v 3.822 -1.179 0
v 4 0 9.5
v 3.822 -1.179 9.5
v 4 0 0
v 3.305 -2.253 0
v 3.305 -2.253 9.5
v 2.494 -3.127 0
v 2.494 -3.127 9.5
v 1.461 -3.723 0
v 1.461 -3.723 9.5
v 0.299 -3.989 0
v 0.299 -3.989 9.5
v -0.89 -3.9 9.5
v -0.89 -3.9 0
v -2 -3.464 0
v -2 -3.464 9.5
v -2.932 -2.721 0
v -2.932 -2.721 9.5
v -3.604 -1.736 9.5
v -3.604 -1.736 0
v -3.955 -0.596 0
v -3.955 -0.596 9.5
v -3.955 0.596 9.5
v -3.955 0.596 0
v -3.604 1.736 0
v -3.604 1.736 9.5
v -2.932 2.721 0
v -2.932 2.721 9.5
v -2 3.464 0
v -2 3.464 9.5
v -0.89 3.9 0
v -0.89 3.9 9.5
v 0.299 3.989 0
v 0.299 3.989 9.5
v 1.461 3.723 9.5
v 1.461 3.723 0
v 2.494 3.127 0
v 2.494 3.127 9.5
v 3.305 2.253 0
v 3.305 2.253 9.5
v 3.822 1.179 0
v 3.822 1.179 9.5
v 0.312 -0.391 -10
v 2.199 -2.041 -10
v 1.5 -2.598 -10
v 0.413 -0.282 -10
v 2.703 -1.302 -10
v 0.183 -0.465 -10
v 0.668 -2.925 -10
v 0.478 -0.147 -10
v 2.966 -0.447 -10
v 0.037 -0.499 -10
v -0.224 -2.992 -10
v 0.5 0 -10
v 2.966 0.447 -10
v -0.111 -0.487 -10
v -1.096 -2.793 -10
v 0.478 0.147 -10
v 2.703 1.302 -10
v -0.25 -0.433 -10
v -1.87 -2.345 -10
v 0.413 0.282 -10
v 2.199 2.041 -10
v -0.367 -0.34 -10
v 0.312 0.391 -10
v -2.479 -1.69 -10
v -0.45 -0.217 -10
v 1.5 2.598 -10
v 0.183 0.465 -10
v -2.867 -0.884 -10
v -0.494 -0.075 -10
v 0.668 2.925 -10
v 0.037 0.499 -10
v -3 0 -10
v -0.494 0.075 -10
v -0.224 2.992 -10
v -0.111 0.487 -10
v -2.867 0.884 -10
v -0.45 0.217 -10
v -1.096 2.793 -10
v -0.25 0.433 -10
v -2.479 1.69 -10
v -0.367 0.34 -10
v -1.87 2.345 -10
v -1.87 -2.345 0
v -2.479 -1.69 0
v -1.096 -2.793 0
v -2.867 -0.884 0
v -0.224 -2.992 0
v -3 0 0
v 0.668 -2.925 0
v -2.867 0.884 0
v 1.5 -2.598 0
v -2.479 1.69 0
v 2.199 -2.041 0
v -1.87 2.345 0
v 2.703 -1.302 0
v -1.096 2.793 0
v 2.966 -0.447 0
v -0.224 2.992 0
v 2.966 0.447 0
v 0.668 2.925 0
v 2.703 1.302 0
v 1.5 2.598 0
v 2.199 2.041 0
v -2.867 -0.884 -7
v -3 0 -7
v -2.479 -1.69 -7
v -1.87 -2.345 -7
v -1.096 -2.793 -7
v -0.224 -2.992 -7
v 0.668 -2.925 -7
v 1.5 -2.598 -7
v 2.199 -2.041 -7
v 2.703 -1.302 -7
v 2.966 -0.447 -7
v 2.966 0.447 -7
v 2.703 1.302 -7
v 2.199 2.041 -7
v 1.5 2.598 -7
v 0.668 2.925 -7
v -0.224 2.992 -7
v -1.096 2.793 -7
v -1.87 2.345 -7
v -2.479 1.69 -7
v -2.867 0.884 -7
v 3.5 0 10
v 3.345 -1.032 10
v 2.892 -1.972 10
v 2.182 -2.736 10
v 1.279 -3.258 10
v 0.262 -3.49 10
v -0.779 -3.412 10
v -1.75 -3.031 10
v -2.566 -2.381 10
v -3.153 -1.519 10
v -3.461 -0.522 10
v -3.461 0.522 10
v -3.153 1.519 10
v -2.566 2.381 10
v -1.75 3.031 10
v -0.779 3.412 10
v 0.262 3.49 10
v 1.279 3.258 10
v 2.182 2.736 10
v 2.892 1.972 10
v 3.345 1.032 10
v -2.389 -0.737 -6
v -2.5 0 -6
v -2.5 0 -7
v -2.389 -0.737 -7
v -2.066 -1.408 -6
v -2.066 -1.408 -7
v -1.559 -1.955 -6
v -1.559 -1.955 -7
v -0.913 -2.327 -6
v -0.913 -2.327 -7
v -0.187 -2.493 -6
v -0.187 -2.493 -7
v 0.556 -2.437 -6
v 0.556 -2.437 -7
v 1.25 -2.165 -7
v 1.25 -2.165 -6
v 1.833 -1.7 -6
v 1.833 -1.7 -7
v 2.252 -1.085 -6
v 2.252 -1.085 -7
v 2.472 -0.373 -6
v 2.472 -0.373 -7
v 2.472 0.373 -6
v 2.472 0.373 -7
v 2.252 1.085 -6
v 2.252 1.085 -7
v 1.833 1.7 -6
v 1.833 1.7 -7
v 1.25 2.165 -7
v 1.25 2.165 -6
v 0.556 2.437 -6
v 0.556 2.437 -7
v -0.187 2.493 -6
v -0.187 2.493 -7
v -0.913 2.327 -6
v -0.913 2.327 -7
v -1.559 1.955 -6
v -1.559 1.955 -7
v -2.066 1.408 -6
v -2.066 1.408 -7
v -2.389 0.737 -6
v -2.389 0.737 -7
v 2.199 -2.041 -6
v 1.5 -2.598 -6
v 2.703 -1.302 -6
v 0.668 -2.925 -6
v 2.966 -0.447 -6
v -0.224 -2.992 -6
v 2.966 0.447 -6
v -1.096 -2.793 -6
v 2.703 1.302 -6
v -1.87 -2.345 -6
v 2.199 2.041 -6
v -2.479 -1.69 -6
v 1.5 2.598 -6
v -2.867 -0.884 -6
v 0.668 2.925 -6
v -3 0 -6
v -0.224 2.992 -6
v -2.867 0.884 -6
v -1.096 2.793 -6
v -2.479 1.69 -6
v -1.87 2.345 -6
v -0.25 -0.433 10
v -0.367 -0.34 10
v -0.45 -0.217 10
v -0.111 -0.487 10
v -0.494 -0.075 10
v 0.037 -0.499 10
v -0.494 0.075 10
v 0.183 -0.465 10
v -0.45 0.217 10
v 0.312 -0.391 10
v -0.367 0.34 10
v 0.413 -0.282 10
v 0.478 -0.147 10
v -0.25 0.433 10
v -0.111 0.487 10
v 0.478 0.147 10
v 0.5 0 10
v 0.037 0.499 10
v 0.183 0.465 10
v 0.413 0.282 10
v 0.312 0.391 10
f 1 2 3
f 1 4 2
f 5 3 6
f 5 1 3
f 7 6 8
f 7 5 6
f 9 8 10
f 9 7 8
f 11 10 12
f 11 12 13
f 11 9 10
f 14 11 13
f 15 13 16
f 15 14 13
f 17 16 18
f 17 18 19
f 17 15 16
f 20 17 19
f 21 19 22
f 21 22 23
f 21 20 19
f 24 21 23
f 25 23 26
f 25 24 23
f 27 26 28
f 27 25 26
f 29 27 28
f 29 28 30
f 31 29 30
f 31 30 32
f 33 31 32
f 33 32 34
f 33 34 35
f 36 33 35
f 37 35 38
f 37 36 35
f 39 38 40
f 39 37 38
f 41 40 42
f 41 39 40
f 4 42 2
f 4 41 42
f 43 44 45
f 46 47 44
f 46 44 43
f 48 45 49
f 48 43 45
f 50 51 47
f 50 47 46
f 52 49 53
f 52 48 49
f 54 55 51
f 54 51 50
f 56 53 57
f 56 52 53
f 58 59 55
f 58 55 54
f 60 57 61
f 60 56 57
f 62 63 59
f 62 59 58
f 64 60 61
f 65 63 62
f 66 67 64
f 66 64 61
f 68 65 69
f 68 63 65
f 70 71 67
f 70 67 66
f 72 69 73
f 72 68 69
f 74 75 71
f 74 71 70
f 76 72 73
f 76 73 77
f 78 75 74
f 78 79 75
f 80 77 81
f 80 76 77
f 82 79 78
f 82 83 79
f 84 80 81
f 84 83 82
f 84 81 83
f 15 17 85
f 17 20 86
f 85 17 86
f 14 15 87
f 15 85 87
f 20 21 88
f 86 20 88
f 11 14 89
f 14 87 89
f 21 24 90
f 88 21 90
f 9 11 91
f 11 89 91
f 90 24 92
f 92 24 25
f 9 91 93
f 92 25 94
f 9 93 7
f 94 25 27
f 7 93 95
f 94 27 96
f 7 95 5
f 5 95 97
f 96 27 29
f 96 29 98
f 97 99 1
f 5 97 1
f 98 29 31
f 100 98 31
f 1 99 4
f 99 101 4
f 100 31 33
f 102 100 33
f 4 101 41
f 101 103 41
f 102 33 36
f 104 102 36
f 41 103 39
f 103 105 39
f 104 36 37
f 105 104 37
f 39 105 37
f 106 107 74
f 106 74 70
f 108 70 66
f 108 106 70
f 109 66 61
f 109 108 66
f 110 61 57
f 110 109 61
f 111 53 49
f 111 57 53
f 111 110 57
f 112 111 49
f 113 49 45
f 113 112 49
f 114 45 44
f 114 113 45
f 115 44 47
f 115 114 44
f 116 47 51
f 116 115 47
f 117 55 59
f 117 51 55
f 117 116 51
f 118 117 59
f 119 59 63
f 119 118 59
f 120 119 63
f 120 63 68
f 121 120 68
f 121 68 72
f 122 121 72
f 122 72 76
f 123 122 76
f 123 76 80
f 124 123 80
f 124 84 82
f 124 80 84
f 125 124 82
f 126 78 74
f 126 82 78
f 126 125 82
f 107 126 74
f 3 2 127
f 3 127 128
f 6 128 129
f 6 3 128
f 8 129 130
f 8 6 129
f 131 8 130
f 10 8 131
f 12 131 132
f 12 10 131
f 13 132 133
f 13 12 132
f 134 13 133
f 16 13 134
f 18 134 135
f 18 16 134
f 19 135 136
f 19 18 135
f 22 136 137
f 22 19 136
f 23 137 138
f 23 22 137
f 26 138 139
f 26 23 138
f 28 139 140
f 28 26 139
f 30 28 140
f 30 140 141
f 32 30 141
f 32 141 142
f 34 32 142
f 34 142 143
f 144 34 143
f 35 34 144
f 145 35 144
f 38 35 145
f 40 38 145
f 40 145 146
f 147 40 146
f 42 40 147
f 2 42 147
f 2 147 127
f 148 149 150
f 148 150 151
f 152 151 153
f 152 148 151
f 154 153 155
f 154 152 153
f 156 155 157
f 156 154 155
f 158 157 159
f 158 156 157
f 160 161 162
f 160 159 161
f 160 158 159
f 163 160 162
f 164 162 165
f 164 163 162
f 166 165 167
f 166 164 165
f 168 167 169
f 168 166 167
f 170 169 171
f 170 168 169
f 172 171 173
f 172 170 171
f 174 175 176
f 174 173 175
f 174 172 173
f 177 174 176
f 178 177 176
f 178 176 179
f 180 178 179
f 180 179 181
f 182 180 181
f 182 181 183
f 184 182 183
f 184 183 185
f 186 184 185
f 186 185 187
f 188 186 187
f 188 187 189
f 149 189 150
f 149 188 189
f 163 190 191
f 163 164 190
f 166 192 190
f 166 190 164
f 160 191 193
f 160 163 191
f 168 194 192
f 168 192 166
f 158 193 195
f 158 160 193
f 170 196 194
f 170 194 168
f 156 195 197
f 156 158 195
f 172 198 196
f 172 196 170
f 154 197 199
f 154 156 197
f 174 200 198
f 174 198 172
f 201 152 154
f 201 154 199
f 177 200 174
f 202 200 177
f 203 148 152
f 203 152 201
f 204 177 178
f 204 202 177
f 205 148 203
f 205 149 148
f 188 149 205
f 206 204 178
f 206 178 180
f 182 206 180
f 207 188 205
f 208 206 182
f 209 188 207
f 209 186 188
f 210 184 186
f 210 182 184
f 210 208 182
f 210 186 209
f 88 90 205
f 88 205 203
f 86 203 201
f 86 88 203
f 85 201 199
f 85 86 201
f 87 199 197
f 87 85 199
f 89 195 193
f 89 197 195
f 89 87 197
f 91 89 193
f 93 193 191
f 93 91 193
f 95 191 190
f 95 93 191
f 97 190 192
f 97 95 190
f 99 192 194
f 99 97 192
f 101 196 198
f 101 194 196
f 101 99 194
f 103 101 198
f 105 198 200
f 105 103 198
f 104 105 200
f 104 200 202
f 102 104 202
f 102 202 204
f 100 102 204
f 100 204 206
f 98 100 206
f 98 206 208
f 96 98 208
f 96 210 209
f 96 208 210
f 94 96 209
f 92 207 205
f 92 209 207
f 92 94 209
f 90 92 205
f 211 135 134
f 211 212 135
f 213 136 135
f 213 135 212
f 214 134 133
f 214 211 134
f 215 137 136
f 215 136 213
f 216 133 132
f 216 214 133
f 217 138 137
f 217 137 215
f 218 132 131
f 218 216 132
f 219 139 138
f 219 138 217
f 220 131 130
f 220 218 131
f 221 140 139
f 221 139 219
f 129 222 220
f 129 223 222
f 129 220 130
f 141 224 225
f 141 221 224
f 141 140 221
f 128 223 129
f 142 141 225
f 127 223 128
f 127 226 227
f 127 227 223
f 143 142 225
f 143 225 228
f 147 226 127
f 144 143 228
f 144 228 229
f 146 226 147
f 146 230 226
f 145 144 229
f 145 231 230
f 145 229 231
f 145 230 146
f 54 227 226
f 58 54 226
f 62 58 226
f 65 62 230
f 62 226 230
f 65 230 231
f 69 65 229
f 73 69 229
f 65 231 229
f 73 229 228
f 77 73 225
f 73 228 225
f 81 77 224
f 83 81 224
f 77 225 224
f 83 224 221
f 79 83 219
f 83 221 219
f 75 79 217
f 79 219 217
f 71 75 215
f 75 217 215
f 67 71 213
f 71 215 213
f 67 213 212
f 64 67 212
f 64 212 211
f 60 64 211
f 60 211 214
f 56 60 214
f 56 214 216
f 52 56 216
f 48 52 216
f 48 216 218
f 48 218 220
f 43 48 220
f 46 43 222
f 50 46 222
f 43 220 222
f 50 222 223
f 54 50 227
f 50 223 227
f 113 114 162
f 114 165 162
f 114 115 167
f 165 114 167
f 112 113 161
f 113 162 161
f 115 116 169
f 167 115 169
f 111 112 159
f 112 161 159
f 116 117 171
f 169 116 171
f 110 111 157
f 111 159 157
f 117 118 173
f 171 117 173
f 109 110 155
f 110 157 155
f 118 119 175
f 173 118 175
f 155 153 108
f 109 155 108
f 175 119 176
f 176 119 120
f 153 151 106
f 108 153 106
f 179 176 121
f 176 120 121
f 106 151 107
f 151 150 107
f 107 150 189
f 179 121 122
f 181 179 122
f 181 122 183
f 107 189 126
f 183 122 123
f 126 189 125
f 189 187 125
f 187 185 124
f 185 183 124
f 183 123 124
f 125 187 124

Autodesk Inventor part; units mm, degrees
ref_plane "YZ Plane" through (0, 0, 0) normal (1, 0, 0) x (0, 1, 0)
ref_plane "XZ Plane" through (0, 0, 0) normal (0, 1, 0) x (-1, 0, 0)
ref_plane "XY Plane" through (0, 0, 0) normal (0, 0, 1) x (1, 0, 0)
sketch "Skizze1" plane through (0, 0, 0) normal (0, 0, 1) x (1, 0, 0)
  line L0 (-5.6, 0) -> (5.6, 0) projected
  line L1 (0, -5.6) -> (0, 5.6) projected
  circle A0 centre (0, 0) radius 4
  dimension "d0" = 8
extrude "Extrusion1" add sketch "Skizze1" along normal blind 10
sketch "Skizze2" plane through (0, 0, 0) normal (0, 0, -1) x (-1, 0, 0)
  circle A0 centre (0, 0) radius 3
  dimension "d3" = 6
extrude "Extrusion2" add sketch "Skizze2" along normal blind 6
sketch "Skizze3" plane through (0, 0, -6) normal (0, 0, -1) x (-1, 0, 0)
  circle A0 centre (0, 0) radius 2.5
  dimension "d6" = 5
extrude "Extrusion3" add sketch "Skizze3" along normal blind 1
sketch "Skizze4" plane through (0, 0, -7) normal (0, 0, -1) x (-1, 0, 0)
  circle A0 centre (0, 0) radius 3
extrude "Extrusion4" add sketch "Skizze4" along normal blind 3
sketch "Skizze5" plane through (0, 0, 10) normal (0, 0, 1) x (1, 0, 0)
  circle A0 centre (0, 0) radius 0.5
  dimension "d11" = 1
extrude "Extrusion5" cut sketch "Skizze5" against normal blind 20
chamfer "Fase1" distance 0.5 angle 45 1 edges at (-4, 0, 10)
properties part number "Nebeldüse"
